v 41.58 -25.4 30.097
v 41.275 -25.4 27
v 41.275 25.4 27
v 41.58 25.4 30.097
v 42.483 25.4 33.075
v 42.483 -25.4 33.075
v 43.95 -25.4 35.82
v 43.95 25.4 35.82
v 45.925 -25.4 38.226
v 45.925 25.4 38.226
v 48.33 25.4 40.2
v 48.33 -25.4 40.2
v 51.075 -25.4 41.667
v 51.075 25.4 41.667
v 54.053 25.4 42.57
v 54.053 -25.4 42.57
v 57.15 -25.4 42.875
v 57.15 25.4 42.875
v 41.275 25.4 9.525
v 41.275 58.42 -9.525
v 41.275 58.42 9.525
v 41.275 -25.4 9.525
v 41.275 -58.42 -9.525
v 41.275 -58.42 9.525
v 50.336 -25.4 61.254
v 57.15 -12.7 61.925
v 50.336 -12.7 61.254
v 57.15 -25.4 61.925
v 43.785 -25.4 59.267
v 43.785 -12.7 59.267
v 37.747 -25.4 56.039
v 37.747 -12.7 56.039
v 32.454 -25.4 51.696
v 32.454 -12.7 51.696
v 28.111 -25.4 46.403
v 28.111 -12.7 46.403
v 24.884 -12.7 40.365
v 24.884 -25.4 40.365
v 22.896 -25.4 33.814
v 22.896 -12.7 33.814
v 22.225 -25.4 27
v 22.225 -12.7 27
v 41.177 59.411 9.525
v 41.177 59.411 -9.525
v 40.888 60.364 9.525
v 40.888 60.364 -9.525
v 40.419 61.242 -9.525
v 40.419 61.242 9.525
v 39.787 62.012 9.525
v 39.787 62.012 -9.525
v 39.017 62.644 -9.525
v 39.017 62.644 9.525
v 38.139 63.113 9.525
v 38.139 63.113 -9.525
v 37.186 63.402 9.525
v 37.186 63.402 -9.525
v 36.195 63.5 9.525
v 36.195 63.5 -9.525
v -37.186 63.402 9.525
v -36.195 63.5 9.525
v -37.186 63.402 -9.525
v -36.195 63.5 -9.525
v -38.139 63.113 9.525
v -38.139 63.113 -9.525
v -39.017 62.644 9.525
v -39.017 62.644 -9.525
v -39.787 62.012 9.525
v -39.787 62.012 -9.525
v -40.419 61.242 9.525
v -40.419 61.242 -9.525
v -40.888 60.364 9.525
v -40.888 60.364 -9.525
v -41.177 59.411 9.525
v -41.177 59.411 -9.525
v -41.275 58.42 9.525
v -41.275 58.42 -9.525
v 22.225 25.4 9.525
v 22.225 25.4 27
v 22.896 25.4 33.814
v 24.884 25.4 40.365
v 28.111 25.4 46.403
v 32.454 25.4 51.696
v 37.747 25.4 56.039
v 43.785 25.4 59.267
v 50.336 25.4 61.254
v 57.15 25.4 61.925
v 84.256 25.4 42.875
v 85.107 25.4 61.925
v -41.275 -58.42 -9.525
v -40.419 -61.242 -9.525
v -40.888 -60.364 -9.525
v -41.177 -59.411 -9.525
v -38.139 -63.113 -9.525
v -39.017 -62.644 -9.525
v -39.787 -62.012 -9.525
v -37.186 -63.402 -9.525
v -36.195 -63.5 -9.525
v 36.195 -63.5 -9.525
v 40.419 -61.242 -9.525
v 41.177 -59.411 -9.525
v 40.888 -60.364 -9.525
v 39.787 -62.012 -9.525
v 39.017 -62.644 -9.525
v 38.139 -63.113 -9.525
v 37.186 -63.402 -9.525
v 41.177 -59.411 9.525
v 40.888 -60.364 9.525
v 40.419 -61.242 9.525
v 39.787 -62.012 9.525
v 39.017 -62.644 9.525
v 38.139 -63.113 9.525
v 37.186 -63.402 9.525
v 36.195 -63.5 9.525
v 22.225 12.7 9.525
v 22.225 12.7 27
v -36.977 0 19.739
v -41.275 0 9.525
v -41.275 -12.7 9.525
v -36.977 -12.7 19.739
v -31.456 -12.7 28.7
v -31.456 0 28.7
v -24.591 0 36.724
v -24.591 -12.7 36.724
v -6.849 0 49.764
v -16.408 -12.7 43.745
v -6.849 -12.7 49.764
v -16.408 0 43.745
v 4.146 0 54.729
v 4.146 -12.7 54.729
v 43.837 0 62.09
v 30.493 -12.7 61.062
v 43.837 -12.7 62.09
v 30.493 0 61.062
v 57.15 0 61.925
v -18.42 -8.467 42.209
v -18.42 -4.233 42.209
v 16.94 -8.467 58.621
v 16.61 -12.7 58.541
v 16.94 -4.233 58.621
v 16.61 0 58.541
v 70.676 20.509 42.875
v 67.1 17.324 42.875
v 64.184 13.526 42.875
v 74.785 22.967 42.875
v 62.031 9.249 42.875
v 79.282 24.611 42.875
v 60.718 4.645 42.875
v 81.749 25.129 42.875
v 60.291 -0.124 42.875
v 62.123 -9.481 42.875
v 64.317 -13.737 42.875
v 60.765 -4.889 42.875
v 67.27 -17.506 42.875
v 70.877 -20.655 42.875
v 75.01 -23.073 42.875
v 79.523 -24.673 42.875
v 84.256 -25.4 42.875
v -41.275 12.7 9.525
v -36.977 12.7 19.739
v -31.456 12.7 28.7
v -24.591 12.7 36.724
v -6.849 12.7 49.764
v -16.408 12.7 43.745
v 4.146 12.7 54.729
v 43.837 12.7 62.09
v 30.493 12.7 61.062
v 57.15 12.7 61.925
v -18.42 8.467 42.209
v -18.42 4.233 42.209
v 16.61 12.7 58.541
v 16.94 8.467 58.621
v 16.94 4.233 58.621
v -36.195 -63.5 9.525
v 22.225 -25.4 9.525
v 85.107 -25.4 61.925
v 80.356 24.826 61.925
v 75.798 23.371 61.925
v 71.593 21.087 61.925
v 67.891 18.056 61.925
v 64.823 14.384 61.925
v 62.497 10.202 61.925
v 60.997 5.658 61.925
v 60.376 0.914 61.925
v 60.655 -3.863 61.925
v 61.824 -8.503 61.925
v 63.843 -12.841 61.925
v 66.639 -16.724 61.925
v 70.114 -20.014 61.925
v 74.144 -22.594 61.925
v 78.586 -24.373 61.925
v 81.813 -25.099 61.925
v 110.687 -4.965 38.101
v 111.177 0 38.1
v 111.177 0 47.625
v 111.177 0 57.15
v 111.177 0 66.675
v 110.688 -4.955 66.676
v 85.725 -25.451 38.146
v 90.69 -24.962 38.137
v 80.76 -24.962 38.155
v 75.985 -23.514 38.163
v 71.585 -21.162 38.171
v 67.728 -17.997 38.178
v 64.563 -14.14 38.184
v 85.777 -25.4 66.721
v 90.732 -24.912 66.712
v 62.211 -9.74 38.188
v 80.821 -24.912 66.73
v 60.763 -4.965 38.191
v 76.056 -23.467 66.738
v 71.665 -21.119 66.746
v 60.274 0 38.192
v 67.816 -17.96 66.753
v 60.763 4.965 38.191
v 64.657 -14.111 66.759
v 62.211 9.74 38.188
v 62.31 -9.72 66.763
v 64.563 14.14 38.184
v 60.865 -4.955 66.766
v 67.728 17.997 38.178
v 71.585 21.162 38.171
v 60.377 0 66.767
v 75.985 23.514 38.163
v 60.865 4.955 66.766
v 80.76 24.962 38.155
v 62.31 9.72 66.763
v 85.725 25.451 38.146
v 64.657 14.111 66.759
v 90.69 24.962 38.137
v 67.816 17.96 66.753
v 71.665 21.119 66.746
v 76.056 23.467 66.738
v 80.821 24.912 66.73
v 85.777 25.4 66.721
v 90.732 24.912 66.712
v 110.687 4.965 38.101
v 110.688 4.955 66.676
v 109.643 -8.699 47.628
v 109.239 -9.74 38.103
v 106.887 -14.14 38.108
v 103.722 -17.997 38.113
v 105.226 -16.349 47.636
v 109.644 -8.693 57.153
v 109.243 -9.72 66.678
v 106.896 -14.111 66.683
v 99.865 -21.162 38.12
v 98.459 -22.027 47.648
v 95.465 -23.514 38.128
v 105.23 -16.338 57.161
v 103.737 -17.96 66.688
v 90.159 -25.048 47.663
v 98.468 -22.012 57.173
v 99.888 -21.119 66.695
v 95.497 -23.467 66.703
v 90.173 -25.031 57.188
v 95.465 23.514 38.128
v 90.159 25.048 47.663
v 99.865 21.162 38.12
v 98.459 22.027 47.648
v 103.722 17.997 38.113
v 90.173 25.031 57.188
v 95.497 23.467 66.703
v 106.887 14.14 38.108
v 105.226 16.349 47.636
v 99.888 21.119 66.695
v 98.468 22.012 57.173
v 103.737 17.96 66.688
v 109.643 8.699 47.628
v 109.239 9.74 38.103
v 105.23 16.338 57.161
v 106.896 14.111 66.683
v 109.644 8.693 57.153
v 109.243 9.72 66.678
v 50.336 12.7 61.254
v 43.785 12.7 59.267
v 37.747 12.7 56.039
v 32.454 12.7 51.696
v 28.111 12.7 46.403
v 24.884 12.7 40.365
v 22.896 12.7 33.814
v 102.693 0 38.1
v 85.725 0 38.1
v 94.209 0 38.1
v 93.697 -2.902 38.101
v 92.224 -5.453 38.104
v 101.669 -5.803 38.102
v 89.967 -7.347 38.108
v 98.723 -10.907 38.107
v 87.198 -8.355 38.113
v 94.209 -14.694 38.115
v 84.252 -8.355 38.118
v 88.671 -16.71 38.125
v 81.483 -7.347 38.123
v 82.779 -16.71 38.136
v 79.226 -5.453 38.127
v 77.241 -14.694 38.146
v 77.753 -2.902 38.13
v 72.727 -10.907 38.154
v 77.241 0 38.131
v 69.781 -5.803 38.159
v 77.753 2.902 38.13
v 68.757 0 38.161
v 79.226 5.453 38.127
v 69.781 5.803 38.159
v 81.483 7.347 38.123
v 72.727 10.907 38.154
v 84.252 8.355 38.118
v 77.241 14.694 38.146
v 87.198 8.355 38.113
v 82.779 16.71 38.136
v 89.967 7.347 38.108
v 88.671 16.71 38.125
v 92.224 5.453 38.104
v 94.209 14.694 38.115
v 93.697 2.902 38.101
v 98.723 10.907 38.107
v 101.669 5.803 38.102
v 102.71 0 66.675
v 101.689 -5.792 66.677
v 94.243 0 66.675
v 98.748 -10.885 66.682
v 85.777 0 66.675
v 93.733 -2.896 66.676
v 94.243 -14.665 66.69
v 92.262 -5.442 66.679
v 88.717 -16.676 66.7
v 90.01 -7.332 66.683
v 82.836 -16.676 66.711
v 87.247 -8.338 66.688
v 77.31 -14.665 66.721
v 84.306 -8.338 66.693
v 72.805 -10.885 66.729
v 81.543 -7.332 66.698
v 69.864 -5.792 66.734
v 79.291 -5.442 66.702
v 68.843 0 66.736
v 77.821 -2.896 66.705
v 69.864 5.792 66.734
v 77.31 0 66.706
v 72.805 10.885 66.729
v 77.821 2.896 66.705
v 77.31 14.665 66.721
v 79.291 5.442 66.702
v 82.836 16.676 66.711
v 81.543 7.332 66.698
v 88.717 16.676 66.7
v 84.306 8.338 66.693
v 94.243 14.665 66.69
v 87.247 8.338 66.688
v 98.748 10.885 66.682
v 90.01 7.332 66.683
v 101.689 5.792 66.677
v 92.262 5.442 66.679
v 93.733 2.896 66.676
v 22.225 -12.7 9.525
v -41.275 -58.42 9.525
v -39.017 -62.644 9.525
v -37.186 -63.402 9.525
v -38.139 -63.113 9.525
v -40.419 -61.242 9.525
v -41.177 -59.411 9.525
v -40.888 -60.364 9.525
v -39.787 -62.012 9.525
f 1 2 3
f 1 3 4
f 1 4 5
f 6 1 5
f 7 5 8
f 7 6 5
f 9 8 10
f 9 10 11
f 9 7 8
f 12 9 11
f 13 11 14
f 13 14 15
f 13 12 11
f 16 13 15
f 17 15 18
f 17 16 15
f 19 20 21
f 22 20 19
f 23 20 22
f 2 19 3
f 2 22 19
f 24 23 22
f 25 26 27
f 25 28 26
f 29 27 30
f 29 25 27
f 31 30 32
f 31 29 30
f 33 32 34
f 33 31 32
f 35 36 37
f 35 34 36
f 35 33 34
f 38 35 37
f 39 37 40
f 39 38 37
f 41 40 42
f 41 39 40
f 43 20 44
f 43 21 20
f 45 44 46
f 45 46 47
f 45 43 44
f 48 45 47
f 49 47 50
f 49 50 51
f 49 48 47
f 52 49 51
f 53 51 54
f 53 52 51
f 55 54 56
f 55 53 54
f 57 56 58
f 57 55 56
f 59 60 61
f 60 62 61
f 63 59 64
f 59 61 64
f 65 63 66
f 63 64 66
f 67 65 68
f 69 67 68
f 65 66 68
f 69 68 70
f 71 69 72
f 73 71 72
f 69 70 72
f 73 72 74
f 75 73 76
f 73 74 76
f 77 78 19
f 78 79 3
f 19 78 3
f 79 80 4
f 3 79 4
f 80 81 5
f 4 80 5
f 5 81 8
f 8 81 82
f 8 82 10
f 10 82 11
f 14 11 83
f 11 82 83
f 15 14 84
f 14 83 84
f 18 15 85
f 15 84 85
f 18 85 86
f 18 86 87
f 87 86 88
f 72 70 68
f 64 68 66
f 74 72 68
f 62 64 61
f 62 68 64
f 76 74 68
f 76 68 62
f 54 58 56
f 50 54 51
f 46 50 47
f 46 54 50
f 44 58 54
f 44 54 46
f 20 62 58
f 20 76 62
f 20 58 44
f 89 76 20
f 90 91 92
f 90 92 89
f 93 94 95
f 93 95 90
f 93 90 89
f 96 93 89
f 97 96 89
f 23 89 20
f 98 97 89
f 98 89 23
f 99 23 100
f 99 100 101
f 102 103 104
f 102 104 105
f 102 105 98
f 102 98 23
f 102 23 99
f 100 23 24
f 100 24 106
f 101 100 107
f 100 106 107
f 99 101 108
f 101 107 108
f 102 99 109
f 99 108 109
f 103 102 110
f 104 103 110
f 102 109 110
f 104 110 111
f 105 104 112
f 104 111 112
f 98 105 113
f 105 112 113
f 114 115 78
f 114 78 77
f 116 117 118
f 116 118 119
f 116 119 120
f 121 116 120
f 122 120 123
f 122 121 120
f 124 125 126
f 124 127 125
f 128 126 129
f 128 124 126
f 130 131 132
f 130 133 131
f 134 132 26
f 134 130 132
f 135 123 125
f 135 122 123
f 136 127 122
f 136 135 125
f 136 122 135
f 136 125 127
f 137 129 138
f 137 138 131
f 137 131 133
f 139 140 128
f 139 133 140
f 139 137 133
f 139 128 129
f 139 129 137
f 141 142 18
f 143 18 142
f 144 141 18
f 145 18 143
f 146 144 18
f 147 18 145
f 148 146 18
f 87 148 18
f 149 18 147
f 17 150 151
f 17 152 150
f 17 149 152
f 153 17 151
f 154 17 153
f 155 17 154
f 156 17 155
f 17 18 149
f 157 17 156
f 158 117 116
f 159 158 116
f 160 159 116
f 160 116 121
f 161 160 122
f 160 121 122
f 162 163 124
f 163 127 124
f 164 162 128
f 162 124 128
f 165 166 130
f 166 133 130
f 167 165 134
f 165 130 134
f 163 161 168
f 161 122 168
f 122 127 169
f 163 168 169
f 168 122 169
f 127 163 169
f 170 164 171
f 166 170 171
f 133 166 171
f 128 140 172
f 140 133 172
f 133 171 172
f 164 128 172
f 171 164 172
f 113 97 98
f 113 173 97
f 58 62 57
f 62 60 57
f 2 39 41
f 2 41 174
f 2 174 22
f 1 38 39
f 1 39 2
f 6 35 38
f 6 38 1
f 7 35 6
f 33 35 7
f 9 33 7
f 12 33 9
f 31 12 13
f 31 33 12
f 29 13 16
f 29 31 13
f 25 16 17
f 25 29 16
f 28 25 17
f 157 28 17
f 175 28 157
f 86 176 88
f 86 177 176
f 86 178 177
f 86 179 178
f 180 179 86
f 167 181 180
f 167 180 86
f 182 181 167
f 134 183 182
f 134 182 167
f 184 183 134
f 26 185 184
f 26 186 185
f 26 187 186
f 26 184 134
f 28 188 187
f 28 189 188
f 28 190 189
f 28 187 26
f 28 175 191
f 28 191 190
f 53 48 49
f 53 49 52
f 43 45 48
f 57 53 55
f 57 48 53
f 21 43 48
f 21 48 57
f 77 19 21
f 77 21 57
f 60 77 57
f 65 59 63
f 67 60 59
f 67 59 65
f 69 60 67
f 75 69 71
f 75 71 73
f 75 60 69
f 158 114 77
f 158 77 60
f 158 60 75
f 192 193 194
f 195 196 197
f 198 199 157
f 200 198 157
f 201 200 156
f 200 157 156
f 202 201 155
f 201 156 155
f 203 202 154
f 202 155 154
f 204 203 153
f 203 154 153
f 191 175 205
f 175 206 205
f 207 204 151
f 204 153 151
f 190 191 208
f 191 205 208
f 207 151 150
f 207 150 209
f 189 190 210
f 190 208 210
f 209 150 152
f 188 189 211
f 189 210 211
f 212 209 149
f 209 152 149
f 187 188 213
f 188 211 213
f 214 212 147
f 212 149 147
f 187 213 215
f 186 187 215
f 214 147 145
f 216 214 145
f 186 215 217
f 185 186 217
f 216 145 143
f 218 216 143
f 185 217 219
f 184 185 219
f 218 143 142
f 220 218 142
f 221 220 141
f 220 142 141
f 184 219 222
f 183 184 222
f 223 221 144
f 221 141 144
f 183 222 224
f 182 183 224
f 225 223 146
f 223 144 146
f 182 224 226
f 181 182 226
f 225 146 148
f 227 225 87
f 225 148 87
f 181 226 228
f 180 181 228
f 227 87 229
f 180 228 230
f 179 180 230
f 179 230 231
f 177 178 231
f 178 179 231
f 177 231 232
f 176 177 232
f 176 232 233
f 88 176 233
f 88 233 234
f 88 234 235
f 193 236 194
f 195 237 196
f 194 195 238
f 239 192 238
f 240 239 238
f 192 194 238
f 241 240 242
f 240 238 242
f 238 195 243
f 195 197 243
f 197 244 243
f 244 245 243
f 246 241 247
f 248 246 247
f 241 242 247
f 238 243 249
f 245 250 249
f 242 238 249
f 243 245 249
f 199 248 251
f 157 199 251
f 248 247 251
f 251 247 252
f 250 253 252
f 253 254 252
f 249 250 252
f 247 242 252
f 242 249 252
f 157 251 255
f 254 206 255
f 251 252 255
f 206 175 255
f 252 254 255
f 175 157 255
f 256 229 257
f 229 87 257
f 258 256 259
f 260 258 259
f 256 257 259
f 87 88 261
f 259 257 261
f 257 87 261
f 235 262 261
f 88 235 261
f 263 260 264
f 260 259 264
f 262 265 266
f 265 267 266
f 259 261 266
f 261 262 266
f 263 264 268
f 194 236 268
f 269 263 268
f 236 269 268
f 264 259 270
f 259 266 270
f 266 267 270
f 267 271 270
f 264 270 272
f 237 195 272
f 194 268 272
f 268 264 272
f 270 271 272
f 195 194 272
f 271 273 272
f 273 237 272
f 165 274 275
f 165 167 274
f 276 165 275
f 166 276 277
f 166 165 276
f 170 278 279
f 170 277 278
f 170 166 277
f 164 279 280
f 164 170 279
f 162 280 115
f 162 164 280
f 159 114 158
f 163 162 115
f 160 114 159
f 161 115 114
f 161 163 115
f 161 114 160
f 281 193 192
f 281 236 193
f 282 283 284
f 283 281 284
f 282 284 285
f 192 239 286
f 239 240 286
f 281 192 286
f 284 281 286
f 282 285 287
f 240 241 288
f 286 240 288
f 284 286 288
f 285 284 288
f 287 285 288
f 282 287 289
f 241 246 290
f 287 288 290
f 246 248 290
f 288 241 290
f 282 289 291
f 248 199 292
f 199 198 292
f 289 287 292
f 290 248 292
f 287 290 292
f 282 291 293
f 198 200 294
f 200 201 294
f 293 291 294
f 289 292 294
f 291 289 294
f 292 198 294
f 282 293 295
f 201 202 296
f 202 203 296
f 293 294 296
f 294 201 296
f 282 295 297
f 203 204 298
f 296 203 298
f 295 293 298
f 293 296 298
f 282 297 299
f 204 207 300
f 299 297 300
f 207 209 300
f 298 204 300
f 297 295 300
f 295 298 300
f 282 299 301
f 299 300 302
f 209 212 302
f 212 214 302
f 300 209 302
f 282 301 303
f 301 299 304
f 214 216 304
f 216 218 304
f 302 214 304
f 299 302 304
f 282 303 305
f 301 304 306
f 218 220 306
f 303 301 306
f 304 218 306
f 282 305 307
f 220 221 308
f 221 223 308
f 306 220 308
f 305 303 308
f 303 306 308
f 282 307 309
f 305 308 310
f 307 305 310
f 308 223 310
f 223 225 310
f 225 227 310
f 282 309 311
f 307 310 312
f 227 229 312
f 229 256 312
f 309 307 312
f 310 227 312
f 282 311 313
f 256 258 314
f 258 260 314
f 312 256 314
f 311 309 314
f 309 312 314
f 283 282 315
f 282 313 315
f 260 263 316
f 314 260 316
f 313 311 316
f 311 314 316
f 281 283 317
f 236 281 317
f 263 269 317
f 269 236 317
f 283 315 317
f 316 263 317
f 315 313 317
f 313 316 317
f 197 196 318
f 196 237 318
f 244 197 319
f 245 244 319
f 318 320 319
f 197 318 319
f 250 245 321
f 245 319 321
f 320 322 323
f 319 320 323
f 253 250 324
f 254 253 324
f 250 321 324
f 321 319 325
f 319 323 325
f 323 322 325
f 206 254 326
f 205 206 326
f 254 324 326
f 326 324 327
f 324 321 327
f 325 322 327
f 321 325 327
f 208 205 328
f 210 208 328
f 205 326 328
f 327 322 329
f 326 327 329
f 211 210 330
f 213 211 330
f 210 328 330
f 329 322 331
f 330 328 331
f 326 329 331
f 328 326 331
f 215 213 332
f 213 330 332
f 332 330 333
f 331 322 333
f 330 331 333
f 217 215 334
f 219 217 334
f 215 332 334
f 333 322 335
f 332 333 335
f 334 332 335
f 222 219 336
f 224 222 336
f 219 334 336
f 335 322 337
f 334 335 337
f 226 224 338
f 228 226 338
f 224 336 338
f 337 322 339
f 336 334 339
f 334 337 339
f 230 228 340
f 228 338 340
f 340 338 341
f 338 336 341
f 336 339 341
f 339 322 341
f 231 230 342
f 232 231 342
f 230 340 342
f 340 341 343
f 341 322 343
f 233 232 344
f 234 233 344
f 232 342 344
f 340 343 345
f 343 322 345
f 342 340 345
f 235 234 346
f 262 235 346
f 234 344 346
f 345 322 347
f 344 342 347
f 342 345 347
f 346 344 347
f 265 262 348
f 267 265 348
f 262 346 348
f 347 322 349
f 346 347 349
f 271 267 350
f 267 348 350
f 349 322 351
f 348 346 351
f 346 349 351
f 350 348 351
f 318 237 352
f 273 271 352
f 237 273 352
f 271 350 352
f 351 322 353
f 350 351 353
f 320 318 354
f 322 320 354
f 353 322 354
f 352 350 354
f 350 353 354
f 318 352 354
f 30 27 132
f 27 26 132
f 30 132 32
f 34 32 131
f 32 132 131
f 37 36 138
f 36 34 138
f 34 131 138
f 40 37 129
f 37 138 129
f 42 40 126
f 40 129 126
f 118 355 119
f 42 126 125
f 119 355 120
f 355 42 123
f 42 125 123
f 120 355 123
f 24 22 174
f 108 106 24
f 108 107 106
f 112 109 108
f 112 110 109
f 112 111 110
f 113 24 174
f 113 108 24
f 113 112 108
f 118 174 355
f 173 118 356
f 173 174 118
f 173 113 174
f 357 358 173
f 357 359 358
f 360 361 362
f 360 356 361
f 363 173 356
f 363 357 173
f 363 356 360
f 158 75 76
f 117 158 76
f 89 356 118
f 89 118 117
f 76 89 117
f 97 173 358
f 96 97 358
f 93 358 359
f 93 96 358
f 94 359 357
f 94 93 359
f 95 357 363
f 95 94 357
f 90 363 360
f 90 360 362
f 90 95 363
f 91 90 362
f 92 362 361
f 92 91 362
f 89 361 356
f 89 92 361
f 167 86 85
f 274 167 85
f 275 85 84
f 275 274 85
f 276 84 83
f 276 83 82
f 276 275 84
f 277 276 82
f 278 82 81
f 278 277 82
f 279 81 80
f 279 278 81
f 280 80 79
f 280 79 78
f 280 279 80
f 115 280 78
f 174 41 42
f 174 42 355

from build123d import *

# Parameters (mm, degrees)
F1_DEPTH = 63.5
F0_W     = 25.348484695
F0_H     = 19.05
F2_DEPTH = 25.4
F3_DEPTH = 12.7
F5_R     = 5.08


with BuildPart() as f1:
    # F0 (on Front) → F1 (new body, symmetric)
    with BuildSketch(Plane.XZ):
        Polygon((22.225, 9.525), (-41.275, 9.525), (-41.275, -9.525), (41.275, -9.525), (41.275, 9.525), align=None)
    extrude(amount=F1_DEPTH, both=True)

    # F0 (on Front) → F2 (join, symmetric)
    with BuildSketch(Plane.XZ):
        with BuildLine():
            Line((22.225, 27.0002), (22.225, 9.525))
            Line((22.225, 9.525), (41.275, 9.525))
            Line((41.275, 9.525), (41.275, 27.0002))
            ThreePointArc((41.275, 27.0002), (45.9246798487, 38.2255201513), (57.15, 42.8752))
            Line((57.15, 42.8752), (60.376515305, 42.8752))
            Line((60.376515305, 42.8752), (60.376515305, 61.9252))
            Line((60.376515305, 61.9252), (57.15, 61.9252))
            ThreePointArc((57.15, 61.9252), (32.4542956671, 51.6959043329), (22.225, 27.0002))
        make_face()
        with Locations((73.0507576525, 52.4002)):
            Rectangle(F0_W, F0_H)
    extrude(amount=F2_DEPTH, both=True)

    # F0 (on Front) → F3 (join, symmetric)
    with BuildSketch(Plane.XZ):
        with BuildLine():
            add(Edge.make_bspline(
                [(-41.275, 9.525), (-27.2249449044, 51.4013841748), (17.066590488, 64.118757844), (57.15, 61.9252)],
                knots=[0, 0, 0, 0, 111.5045361635, 111.5045361635, 111.5045361635, 111.5045361635], degree=3))
            Line((-41.275, 9.525), (22.225, 9.525))
            Line((22.225, 9.525), (22.225, 27.0002))
            ThreePointArc((22.225, 27.0002), (32.4542956671, 51.6959043329), (57.15, 61.9252))
        make_face()
    extrude(amount=F3_DEPTH, both=True)

    # F0 (on Front) → F4 (revolve)
    with BuildSketch(Plane.XZ):
        Polygon((111.176515305, 66.675), (85.776515305, 66.675), (85.725, 38.1), (111.176515305, 38.1), align=None)
    revolve(axis=Axis((85.7507576525, 0, 52.3875), (-0.0018028074, 0, -0.9999983749)))

    # F5
    f5_edges = [f1.edges().sort_by_distance(p)[0] for p in [
        (-41.275, -63.5, 0),
        (41.275, -63.5, 0),
        (41.275, 63.5, 0),
        (-41.275, 63.5, 0),
    ]]
    fillet(f5_edges, radius=F5_R)


solid = f1.part
